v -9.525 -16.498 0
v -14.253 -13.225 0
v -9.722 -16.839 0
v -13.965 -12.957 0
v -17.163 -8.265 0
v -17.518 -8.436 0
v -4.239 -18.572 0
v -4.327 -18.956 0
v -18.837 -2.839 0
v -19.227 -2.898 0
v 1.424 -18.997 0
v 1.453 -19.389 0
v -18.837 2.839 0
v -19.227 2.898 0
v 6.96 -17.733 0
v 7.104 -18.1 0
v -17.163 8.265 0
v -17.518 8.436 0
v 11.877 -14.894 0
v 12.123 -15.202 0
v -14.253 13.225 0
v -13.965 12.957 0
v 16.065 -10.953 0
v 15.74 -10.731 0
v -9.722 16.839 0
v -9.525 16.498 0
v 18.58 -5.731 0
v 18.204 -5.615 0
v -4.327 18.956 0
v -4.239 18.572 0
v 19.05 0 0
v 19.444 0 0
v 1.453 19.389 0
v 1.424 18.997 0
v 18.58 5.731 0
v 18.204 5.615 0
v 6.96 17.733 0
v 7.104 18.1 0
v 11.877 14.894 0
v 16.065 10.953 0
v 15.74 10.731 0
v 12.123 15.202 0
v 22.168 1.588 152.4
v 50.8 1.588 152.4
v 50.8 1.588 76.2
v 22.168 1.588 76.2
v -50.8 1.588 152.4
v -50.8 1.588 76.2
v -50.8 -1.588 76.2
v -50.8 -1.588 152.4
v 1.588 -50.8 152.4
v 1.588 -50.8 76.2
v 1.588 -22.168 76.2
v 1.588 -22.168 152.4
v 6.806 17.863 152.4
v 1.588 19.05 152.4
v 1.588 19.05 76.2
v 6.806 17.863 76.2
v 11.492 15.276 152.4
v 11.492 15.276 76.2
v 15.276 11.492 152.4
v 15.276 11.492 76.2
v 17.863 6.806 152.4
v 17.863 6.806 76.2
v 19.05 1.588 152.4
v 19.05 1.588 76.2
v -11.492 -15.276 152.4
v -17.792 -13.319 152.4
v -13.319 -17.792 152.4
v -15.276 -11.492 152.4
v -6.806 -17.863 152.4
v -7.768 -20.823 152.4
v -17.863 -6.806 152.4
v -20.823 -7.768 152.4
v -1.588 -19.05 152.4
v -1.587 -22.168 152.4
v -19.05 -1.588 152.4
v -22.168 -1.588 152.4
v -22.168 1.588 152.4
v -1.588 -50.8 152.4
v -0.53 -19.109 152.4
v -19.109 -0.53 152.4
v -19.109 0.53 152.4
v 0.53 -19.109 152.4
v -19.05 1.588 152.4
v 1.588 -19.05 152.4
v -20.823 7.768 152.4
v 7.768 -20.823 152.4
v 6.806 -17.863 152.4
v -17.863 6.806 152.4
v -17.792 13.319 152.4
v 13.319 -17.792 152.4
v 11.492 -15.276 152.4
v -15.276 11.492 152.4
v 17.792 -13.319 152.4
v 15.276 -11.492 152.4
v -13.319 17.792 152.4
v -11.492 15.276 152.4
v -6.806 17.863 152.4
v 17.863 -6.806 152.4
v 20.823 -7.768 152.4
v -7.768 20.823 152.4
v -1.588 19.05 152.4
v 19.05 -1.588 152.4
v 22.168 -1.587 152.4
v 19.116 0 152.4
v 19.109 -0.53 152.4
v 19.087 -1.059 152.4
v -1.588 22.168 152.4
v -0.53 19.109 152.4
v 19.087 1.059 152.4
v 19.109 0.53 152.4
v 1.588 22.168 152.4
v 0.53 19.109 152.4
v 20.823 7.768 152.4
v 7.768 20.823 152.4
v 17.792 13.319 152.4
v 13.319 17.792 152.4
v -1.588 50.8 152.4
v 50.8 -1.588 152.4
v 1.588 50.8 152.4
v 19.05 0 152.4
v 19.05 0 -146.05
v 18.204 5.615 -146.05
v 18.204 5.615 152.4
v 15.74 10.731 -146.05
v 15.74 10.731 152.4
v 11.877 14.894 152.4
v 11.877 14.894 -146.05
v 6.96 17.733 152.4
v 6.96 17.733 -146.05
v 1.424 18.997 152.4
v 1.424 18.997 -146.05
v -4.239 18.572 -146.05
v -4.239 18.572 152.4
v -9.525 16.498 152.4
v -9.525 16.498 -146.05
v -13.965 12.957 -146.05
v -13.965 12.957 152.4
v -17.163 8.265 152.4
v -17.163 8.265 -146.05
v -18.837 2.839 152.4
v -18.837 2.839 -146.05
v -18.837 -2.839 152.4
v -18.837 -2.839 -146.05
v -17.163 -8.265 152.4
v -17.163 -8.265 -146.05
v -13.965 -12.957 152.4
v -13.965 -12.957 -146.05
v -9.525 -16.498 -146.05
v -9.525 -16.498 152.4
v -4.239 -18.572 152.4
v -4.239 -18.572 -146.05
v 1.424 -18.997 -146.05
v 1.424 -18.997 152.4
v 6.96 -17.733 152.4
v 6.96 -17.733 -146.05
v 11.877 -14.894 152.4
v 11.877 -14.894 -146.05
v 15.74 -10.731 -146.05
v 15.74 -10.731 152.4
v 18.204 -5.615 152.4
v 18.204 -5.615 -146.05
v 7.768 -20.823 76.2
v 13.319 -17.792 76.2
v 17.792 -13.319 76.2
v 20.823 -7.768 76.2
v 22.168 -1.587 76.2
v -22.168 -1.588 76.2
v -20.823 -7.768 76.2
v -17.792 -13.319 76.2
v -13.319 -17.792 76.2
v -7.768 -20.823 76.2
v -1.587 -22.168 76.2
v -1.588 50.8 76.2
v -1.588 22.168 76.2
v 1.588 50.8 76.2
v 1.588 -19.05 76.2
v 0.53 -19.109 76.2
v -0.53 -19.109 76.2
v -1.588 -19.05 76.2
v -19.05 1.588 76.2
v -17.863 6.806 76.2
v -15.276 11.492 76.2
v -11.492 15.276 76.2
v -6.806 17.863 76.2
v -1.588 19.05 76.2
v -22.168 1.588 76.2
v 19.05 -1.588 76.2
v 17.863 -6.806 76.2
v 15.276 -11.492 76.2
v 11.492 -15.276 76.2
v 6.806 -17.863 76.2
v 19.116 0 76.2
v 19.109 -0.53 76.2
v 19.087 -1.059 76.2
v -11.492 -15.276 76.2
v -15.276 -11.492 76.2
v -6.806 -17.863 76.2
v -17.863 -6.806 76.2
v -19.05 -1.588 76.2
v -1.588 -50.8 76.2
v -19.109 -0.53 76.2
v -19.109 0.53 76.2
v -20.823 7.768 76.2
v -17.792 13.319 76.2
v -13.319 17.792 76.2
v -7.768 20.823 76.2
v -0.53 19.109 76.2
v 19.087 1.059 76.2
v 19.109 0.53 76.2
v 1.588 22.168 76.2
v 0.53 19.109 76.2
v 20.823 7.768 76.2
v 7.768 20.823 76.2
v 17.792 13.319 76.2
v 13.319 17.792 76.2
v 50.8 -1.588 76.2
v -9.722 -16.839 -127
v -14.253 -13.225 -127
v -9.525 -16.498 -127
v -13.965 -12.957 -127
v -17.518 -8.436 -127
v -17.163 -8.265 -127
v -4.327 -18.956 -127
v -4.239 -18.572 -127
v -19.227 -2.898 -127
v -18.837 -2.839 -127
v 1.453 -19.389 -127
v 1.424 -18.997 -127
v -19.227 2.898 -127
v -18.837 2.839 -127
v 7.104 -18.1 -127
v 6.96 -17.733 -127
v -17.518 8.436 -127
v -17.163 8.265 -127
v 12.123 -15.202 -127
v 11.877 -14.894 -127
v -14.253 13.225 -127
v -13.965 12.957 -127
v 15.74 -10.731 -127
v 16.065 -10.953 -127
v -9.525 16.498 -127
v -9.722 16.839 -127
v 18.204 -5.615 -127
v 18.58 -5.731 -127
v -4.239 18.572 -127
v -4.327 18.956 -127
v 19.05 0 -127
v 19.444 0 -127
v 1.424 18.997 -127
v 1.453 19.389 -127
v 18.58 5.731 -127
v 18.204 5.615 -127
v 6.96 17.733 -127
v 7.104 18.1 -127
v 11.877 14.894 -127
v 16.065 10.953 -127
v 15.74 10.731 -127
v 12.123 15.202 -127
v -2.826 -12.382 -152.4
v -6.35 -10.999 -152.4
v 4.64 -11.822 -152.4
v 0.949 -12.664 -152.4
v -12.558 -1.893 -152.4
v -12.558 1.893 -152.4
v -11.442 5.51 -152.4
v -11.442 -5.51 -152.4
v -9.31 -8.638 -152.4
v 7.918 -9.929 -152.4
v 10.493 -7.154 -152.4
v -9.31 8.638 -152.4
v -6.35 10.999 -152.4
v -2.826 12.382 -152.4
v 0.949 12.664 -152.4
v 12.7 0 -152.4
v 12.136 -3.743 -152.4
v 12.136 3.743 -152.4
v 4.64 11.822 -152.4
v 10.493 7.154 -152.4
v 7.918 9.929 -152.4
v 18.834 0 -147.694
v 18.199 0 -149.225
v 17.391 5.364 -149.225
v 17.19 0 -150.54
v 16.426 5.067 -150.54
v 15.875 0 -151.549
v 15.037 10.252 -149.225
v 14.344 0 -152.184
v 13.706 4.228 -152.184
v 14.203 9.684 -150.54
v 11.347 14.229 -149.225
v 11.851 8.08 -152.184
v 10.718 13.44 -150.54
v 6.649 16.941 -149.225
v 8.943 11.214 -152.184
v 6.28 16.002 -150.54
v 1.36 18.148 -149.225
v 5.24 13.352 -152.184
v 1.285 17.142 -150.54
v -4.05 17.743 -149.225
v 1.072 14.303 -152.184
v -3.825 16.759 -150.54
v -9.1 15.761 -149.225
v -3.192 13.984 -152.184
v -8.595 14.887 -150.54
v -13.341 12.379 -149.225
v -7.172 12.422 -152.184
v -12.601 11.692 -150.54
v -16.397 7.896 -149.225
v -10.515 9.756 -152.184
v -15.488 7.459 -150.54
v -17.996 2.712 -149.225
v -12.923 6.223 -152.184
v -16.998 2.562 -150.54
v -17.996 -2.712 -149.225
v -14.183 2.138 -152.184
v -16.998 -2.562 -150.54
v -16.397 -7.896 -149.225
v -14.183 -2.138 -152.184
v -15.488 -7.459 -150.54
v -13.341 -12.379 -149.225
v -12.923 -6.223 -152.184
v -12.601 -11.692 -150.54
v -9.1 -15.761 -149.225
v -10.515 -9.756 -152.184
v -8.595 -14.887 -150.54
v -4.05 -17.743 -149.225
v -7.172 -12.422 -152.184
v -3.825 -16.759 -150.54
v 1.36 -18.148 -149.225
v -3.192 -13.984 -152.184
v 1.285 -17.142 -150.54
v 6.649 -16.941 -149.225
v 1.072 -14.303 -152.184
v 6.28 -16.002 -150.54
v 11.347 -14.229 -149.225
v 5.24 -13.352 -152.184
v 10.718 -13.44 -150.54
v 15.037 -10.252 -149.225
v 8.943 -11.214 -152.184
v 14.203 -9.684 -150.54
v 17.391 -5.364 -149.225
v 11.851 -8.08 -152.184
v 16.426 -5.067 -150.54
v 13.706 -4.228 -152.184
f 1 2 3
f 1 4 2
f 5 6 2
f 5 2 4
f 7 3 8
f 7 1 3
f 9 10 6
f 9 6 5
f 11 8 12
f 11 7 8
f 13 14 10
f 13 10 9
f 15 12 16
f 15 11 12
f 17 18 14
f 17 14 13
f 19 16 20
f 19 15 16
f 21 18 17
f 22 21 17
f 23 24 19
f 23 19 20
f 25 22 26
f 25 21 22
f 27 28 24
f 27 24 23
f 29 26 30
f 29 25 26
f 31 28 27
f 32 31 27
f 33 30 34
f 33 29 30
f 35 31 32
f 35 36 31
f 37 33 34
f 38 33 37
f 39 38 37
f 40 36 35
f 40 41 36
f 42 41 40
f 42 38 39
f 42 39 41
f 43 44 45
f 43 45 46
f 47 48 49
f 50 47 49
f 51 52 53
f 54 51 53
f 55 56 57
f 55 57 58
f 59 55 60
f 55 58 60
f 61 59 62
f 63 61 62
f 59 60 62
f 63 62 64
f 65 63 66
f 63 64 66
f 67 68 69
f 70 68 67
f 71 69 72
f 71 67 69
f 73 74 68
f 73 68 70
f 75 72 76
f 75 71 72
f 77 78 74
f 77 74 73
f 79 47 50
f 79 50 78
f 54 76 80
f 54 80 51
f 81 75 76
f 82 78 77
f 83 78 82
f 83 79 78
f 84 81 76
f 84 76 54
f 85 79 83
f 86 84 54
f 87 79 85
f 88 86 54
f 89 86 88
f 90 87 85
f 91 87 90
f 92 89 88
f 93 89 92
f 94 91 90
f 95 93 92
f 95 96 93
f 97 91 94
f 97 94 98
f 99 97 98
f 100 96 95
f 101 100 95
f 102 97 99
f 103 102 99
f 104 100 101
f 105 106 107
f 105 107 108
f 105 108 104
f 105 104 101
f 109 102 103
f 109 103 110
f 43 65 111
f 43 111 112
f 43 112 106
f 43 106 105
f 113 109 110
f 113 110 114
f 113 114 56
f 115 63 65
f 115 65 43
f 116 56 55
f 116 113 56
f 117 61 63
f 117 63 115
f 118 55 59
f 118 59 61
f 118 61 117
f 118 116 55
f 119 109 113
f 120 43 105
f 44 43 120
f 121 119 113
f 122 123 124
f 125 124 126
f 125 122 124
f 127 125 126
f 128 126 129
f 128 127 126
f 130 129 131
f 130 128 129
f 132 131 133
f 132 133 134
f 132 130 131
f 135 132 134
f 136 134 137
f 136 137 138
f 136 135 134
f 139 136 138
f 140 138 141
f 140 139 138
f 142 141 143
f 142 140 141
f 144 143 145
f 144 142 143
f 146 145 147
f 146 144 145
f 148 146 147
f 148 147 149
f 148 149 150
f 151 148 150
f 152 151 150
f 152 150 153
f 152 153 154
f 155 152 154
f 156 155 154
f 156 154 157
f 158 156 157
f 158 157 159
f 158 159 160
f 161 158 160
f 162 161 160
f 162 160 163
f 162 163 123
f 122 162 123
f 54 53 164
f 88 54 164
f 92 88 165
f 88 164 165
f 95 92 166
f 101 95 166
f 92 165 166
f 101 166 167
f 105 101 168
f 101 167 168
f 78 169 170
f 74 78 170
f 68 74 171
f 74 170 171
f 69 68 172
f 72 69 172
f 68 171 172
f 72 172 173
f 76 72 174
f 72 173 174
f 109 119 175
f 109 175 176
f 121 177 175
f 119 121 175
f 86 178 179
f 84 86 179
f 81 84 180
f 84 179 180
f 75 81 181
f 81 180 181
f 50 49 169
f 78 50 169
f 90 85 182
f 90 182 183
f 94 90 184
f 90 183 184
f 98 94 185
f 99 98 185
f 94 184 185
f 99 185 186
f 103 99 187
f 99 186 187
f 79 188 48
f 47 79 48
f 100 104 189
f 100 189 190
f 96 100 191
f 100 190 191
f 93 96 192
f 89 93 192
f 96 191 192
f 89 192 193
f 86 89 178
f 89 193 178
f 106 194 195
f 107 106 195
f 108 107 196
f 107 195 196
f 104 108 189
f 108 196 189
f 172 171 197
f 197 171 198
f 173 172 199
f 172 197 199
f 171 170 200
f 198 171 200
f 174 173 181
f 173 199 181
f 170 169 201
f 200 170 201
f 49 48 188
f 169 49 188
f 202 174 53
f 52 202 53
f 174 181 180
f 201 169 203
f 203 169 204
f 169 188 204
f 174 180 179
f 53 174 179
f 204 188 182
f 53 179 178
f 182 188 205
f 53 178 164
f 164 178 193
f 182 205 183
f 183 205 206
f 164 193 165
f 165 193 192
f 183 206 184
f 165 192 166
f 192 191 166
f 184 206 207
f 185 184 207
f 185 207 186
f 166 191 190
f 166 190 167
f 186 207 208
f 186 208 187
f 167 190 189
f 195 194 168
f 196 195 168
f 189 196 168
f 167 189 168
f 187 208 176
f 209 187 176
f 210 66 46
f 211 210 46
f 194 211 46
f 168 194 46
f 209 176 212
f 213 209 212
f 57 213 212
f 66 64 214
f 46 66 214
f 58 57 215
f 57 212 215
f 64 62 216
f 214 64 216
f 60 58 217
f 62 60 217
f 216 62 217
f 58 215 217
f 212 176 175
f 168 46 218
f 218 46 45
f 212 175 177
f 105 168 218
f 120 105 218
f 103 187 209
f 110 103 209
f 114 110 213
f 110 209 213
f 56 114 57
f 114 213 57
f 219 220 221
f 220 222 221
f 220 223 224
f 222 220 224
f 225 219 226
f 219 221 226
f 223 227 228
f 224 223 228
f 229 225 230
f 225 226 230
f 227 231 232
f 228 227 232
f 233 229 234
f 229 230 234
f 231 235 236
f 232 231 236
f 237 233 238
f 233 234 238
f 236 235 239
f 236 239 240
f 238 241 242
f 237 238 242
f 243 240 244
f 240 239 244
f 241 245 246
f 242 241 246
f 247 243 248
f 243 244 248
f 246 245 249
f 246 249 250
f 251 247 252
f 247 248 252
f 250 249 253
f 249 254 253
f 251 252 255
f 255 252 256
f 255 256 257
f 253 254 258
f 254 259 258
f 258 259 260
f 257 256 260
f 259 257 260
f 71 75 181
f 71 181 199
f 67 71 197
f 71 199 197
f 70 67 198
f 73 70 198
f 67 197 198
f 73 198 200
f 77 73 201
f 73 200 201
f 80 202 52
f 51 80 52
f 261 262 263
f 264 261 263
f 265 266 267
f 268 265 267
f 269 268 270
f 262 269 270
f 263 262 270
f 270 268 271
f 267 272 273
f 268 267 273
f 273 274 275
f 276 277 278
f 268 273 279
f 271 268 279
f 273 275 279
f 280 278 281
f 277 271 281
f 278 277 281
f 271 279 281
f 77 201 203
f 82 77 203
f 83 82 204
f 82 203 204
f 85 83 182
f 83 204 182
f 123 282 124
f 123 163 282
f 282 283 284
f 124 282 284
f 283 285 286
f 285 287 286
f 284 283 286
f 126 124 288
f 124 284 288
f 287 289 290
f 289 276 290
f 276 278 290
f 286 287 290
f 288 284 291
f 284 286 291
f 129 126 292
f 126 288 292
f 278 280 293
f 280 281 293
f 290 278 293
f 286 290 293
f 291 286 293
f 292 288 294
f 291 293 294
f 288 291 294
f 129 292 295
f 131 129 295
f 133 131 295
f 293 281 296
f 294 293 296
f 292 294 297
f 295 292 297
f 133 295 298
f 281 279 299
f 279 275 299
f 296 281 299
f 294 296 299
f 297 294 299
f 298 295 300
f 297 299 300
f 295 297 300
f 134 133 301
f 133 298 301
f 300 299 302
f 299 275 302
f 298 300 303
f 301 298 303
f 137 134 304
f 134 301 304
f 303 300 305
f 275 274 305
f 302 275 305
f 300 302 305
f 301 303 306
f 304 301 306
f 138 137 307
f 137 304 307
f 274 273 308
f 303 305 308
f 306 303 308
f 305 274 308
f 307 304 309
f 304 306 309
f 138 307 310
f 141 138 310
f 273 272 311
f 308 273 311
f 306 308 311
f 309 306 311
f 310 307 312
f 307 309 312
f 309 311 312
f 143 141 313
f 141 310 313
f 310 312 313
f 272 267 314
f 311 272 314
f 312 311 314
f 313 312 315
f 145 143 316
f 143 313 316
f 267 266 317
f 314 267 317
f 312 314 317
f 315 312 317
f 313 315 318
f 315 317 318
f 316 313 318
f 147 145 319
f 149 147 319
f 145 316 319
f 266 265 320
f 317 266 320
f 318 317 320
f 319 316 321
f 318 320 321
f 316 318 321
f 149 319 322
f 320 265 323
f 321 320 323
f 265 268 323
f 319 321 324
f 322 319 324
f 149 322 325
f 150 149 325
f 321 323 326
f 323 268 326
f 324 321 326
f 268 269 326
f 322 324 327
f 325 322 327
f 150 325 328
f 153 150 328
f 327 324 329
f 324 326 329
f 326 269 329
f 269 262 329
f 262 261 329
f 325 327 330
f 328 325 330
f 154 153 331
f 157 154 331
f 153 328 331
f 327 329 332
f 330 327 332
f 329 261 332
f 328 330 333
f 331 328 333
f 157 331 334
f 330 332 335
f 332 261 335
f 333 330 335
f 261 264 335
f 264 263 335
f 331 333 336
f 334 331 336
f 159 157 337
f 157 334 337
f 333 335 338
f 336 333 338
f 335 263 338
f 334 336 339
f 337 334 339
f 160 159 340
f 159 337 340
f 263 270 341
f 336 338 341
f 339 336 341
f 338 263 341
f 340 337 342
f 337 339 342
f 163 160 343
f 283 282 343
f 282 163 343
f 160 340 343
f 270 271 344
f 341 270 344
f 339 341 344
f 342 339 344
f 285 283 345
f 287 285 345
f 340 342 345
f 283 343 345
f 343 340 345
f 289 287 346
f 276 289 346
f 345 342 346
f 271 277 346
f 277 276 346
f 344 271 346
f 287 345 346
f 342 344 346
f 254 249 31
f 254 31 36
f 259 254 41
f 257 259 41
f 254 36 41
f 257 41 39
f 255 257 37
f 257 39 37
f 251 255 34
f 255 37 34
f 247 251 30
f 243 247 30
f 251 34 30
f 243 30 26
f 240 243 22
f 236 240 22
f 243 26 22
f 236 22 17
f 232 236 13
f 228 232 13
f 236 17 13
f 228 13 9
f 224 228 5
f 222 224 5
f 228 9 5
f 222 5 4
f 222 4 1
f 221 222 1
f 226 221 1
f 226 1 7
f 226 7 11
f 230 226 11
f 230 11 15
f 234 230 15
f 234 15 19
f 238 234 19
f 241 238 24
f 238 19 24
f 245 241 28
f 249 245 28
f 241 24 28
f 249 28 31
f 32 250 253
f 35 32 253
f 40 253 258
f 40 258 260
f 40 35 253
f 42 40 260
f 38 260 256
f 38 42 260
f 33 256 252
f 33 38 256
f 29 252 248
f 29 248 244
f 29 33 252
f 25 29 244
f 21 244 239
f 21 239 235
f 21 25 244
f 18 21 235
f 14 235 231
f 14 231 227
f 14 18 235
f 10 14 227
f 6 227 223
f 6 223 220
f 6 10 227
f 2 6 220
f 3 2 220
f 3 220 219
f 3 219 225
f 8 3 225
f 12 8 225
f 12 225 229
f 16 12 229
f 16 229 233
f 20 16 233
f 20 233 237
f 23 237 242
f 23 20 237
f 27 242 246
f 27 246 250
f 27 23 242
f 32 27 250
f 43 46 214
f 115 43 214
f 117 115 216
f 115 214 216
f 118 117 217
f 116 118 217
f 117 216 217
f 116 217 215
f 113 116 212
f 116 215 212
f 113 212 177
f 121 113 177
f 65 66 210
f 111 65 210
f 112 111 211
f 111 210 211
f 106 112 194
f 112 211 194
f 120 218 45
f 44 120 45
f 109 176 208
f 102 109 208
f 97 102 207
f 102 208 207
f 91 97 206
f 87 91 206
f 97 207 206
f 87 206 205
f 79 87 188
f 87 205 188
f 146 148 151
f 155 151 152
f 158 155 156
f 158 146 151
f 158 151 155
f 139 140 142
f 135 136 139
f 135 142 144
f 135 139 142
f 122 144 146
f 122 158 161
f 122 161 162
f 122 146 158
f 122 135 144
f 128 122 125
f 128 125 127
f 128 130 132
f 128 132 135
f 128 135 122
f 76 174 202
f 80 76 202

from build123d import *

# Parameters (mm, degrees)
F0_R          = 19.05
F1_DEPTH      = 152.4
F1_DEPTH_BACK = 152.4
F3_START      = 76.2
F3_DEPTH      = 76.2
F4_R          = 6.35
F5_R          = 19.4437
F5_R_2        = 19.05
F6_DEPTH      = 127


with BuildPart() as f1:
    # F0 (on Top) → F1 (new body, two sides)
    with BuildSketch(Plane.XY) as f1_sk:
        Circle(F0_R)
    extrude(amount=F1_DEPTH)
    extrude(f1_sk.sketch, amount=-F1_DEPTH_BACK)

    # F4
    f4_edges = [f1.edges().sort_by_distance(p)[0] for p in [
        (-19.05, 0, -152.4),
    ]]
    fillet(f4_edges, radius=F4_R)


with BuildPart() as f3:
    # F2 (on Top) → F3 (new body)
    with BuildSketch(Plane.XY.offset(F3_START)):
        with BuildLine():
            ThreePointArc((22.1682310695, -1.5875), (22.2108032331, -0.7942573515), (22.225, 0))
            ThreePointArc((22.225, 0), (22.2108032331, 0.7942573515), (22.1682310695, 1.5875))
            Line((22.1682310695, 1.5875), (19.05, 1.5875))
            ThreePointArc((19.05, 1.5875), (19.0995164115, 0.7944363403), (19.1160313938, 0))
            ThreePointArc((19.1160313938, 0), (19.0995164115, -0.7944363403), (19.05, -1.5875))
            Line((19.05, -1.5875), (22.1682310695, -1.5875))
        make_face()
        with BuildLine():
            ThreePointArc((22.1682310695, 1.5875), (22.2108032331, 0.7942573515), (22.225, 0))
            ThreePointArc((22.225, 0), (22.2108032331, -0.7942573515), (22.1682310695, -1.5875))
            Line((22.1682310695, -1.5875), (50.8, -1.5875))
            Line((50.8, -1.5875), (50.8, 1.5875))
            Line((50.8, 1.5875), (22.1682310695, 1.5875))
        make_face()
        with BuildLine():
            Line((19.05, 1.5875), (22.1682310695, 1.5875))
            ThreePointArc((22.1682310695, 1.5875), (15.7154482119, 15.7154482119), (1.5875, 22.1682310695))
            Line((1.5875, 22.1682310695), (1.5875, 19.05))
            ThreePointArc((1.5875, 19.05), (13.517075428, 13.517075428), (19.05, 1.5875))
        make_face()
        with BuildLine():
            ThreePointArc((1.5875, -22.1682310695), (15.7154482119, -15.7154482119), (22.1682310695, -1.5875))
            Line((22.1682310695, -1.5875), (19.05, -1.5875))
            ThreePointArc((19.05, -1.5875), (13.517075428, -13.517075428), (1.5875, -19.05))
            Line((1.5875, -19.05), (1.5875, -22.1682310695))
        make_face()
        with BuildLine():
            Line((1.5875, 19.05), (1.5875, 22.1682310695))
            ThreePointArc((1.5875, 22.1682310695), (0, 22.225), (-1.5875, 22.1682310695))
            Line((-1.5875, 22.1682310695), (-1.5875, 19.05))
            ThreePointArc((-1.5875, 19.05), (0, 19.1160313938), (1.5875, 19.05))
        make_face()
        with BuildLine():
            ThreePointArc((-1.5875, 22.1682310695), (0, 22.225), (1.5875, 22.1682310695))
            Line((1.5875, 22.1682310695), (1.5875, 50.8))
            Line((1.5875, 50.8), (-1.5875, 50.8))
            Line((-1.5875, 50.8), (-1.5875, 22.1682310695))
        make_face()
        with BuildLine():
            Line((1.5875, -50.8), (1.5875, -22.1682310695))
            ThreePointArc((1.5875, -22.1682310695), (0, -22.225), (-1.5875, -22.1682310695))
            Line((-1.5875, -22.1682310695), (-1.5875, -50.8))
            Line((-1.5875, -50.8), (1.5875, -50.8))
        make_face()
        with BuildLine():
            ThreePointArc((-1.5875, -22.1682310695), (0, -22.225), (1.5875, -22.1682310695))
            Line((1.5875, -22.1682310695), (1.5875, -19.05))
            ThreePointArc((1.5875, -19.05), (0, -19.1160313938), (-1.5875, -19.05))
            Line((-1.5875, -19.05), (-1.5875, -22.1682310695))
        make_face()
        with BuildLine():
            Line((-1.5875, 19.05), (-1.5875, 22.1682310695))
            ThreePointArc((-1.5875, 22.1682310695), (-15.7154482119, 15.7154482119), (-22.1682310695, 1.5875))
            Line((-22.1682310695, 1.5875), (-19.05, 1.5875))
            ThreePointArc((-19.05, 1.5875), (-13.517075428, 13.517075428), (-1.5875, 19.05))
        make_face()
        with BuildLine():
            ThreePointArc((-22.1682310695, -1.5875), (-15.7154482119, -15.7154482119), (-1.5875, -22.1682310695))
            Line((-1.5875, -22.1682310695), (-1.5875, -19.05))
            ThreePointArc((-1.5875, -19.05), (-13.517075428, -13.517075428), (-19.05, -1.5875))
            Line((-19.05, -1.5875), (-22.1682310695, -1.5875))
        make_face()
        with BuildLine():
            Line((-19.05, 1.5875), (-22.1682310695, 1.5875))
            ThreePointArc((-22.1682310695, 1.5875), (-22.225, 0), (-22.1682310695, -1.5875))
            Line((-22.1682310695, -1.5875), (-19.05, -1.5875))
            ThreePointArc((-19.05, -1.5875), (-19.1160313938, 0), (-19.05, 1.5875))
        make_face()
        with BuildLine():
            ThreePointArc((-22.1682310695, -1.5875), (-22.225, 0), (-22.1682310695, 1.5875))
            Line((-22.1682310695, 1.5875), (-50.8, 1.5875))
            Line((-50.8, 1.5875), (-50.8, -1.5875))
            Line((-50.8, -1.5875), (-22.1682310695, -1.5875))
        make_face()
    extrude(amount=F3_DEPTH)


with BuildPart() as f6:
    # F5 (on Top) → F6 (new body)
    with BuildSketch(Plane.XY):
        Circle(F5_R)
        Circle(F5_R_2, mode=Mode.SUBTRACT)
    extrude(amount=-F6_DEPTH)


solid = Compound([f1.part, f3.part, f6.part])
